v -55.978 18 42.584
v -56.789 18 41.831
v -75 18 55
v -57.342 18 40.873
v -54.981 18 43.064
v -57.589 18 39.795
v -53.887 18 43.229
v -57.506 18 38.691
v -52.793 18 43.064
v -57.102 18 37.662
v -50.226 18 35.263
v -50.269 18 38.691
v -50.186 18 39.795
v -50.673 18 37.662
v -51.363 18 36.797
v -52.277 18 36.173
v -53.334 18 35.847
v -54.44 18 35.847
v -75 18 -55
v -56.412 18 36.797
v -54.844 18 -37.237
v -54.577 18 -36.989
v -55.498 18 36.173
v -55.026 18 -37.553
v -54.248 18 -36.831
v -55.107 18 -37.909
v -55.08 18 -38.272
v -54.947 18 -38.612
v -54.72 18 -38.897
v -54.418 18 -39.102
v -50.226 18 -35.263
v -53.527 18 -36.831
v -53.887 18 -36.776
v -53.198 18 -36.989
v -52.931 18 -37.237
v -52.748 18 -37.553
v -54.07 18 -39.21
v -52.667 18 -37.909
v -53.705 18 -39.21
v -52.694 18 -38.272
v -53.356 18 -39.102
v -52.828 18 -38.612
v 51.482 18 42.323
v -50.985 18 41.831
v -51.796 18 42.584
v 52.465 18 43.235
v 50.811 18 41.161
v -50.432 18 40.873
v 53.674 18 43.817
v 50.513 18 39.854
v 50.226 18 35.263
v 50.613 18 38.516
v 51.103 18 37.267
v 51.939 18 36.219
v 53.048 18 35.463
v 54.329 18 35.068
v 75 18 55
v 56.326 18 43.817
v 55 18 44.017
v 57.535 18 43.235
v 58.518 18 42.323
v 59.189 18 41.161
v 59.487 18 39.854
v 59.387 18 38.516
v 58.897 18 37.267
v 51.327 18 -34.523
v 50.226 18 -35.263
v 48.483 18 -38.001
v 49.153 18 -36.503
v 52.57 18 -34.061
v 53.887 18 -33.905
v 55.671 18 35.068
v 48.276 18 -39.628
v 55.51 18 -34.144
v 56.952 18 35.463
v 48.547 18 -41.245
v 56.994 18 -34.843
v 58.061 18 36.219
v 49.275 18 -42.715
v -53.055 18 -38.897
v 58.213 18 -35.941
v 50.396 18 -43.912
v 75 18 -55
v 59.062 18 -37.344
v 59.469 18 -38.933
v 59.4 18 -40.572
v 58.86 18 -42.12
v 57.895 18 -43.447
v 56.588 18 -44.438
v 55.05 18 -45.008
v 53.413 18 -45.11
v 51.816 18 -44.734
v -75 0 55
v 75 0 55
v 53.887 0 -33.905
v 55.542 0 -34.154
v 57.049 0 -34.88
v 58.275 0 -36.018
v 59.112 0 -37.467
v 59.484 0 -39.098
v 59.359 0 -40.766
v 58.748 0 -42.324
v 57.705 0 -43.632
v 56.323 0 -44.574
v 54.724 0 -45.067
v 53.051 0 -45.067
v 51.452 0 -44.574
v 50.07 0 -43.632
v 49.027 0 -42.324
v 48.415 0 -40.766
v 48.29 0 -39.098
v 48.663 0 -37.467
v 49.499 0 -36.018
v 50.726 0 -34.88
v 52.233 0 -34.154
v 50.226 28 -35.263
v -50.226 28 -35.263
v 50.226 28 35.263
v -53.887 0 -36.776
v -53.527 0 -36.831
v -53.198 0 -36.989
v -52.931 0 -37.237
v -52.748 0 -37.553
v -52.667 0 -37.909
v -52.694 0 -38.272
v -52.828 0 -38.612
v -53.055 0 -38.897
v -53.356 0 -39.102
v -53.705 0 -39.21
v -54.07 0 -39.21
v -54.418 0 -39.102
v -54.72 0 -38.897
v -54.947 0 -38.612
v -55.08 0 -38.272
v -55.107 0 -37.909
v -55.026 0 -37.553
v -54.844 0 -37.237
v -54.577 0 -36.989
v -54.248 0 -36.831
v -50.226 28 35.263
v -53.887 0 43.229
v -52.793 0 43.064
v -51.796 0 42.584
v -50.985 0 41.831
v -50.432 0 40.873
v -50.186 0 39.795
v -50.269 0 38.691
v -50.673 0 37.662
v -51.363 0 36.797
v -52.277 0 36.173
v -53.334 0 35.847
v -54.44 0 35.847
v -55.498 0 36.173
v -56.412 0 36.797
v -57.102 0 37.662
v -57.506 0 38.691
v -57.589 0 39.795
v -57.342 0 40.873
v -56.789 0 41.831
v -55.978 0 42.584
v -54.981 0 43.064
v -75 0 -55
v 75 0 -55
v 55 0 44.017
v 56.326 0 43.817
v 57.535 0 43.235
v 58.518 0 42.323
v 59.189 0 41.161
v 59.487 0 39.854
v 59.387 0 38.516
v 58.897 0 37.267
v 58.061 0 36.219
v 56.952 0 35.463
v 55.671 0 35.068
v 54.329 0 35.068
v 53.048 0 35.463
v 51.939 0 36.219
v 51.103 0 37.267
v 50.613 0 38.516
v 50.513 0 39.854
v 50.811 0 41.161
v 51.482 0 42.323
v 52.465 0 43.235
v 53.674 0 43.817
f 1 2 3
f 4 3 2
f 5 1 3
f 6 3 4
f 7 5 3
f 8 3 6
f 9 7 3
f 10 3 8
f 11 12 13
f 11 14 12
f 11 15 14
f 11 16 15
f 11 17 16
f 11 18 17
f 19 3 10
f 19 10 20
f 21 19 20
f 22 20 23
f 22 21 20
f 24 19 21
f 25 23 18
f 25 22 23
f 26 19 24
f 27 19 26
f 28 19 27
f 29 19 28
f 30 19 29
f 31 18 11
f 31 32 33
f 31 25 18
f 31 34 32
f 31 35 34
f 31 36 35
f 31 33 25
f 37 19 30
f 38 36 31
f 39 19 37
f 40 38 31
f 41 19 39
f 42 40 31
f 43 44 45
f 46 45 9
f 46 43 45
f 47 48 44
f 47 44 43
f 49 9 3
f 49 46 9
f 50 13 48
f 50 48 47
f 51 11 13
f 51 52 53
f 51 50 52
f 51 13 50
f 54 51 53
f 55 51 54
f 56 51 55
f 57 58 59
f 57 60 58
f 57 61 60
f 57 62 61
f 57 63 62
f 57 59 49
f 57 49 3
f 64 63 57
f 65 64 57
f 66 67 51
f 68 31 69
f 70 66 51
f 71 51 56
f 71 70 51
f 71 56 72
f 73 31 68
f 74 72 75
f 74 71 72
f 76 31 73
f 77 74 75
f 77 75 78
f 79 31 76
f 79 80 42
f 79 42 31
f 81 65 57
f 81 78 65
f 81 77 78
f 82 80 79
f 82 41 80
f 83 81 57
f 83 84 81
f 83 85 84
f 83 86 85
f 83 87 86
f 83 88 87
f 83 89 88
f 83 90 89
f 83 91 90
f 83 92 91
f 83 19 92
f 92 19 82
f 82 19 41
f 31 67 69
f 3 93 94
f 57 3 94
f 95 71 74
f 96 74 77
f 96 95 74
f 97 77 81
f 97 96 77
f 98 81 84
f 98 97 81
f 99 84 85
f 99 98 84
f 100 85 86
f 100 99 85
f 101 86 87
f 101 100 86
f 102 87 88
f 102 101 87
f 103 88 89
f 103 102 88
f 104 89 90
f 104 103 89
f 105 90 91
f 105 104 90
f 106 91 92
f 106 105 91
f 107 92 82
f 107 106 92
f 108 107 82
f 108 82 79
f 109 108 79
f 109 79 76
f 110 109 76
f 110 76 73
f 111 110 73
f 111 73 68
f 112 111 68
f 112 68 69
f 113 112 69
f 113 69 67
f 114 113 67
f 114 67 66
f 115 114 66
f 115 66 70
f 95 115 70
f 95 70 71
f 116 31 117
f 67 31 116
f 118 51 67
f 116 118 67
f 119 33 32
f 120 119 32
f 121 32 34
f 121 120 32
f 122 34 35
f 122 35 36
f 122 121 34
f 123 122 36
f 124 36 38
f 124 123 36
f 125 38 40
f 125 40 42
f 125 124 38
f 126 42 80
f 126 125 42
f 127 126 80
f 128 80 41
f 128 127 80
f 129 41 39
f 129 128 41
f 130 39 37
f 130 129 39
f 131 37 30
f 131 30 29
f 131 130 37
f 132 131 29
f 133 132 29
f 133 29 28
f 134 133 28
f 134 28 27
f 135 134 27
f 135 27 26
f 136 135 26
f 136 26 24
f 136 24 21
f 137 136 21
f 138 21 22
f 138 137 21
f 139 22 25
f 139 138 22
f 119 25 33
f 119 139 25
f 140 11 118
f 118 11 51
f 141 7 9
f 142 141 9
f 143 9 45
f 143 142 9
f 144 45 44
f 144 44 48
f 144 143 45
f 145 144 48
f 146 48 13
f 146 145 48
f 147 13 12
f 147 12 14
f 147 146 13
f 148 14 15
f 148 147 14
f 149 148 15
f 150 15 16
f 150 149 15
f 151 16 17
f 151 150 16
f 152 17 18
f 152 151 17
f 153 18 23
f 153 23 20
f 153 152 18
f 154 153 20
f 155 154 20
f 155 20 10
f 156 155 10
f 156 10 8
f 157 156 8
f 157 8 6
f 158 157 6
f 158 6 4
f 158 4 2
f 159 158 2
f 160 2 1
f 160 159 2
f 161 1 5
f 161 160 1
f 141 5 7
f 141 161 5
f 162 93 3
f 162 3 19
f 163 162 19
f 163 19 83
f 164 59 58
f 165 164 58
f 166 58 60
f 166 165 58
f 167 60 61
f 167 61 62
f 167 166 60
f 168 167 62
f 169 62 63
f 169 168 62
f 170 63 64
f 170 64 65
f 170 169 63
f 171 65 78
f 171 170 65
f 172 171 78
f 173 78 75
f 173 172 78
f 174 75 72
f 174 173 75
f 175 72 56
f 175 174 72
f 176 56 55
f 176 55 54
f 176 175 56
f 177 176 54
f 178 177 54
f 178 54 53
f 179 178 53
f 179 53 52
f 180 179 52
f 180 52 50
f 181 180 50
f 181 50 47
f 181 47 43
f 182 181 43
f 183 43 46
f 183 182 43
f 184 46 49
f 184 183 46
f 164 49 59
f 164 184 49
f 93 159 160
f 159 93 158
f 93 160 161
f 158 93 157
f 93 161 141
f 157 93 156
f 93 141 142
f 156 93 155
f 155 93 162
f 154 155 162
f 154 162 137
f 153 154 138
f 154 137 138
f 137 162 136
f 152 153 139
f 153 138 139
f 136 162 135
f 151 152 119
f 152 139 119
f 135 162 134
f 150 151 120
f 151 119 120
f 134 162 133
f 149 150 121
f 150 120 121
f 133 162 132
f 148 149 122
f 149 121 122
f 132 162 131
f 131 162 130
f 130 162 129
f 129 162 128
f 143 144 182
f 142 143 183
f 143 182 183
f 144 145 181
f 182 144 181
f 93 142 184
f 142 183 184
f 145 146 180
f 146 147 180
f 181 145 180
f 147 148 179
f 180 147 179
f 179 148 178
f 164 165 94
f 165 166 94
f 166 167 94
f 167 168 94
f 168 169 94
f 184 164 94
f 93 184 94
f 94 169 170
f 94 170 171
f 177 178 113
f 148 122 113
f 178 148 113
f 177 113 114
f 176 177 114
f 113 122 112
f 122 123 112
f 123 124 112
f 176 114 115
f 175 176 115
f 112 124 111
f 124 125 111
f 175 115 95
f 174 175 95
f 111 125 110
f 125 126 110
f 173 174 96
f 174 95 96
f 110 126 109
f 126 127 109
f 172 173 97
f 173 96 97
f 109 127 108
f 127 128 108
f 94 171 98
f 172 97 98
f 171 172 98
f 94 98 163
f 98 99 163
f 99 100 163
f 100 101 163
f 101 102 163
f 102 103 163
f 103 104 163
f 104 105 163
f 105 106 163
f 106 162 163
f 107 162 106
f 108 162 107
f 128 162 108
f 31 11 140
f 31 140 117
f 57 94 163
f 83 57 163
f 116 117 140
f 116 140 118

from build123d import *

# Parameters (mm, degrees)
F_01_BASE_PROFILE_W           = 150
F_01_BASE_PROFILE_H           = 110
F_01_BASE_PROFILE_R           = 3.711604984
F_01_BASE_PROFILE_R_2         = 4.5
F_01_BASE_PROFILE_R_3         = 1.223591395
F_01_BASE_PROFILE_R_4         = 5.612716763
F_01_BASE_PROFILE_W_2         = 70
F_01_BASE_PROFILE_H_2         = 24
F_01_BASE_EXTRUDE_DEPTH       = 18
F_02_BOSS_PROFILE_W           = 100.452577252
F_02_BOSS_PROFILE_H           = 70.52593178
F_02_REINFORCEMENT_BOSS_DEPTH = 28


with BuildPart() as part:
    # 01_Base_Profile → 01_Base_Extrude (new body)
    with BuildSketch(Plane(origin=(0, 0, 0), x_dir=(1, 0, 0), z_dir=(0, 1, 0))):
        Rectangle(F_01_BASE_PROFILE_W, F_01_BASE_PROFILE_H)
        with Locations(Location((-53.887283237, -39.51734104, 0), (0, 0, 270))):
            Circle(F_01_BASE_PROFILE_R, mode=Mode.SUBTRACT)
        with Locations(Location((55, -39.51734104, 0), (0, 0, 270))):
            Circle(F_01_BASE_PROFILE_R_2, mode=Mode.SUBTRACT)
        with Locations(Location((-53.887283237, 38, 0), (0, 0, 270))):
            Circle(F_01_BASE_PROFILE_R_3, mode=Mode.SUBTRACT)
        with Locations(Location((53.887283237, 39.51734104, 0), (0, 0, 270))):
            Circle(F_01_BASE_PROFILE_R_4, mode=Mode.SUBTRACT)
        Rectangle(F_01_BASE_PROFILE_W_2, F_01_BASE_PROFILE_H_2, mode=Mode.SUBTRACT)
    extrude(amount=F_01_BASE_EXTRUDE_DEPTH)

    # 02_Boss_Profile → 02_Reinforcement_Boss (add)
    with BuildSketch(Plane(origin=(0, 0, 0), x_dir=(1, 0, 0), z_dir=(0, 1, 0))):
        Rectangle(F_02_BOSS_PROFILE_W, F_02_BOSS_PROFILE_H)
    extrude(amount=F_02_REINFORCEMENT_BOSS_DEPTH)


solid = part.part
